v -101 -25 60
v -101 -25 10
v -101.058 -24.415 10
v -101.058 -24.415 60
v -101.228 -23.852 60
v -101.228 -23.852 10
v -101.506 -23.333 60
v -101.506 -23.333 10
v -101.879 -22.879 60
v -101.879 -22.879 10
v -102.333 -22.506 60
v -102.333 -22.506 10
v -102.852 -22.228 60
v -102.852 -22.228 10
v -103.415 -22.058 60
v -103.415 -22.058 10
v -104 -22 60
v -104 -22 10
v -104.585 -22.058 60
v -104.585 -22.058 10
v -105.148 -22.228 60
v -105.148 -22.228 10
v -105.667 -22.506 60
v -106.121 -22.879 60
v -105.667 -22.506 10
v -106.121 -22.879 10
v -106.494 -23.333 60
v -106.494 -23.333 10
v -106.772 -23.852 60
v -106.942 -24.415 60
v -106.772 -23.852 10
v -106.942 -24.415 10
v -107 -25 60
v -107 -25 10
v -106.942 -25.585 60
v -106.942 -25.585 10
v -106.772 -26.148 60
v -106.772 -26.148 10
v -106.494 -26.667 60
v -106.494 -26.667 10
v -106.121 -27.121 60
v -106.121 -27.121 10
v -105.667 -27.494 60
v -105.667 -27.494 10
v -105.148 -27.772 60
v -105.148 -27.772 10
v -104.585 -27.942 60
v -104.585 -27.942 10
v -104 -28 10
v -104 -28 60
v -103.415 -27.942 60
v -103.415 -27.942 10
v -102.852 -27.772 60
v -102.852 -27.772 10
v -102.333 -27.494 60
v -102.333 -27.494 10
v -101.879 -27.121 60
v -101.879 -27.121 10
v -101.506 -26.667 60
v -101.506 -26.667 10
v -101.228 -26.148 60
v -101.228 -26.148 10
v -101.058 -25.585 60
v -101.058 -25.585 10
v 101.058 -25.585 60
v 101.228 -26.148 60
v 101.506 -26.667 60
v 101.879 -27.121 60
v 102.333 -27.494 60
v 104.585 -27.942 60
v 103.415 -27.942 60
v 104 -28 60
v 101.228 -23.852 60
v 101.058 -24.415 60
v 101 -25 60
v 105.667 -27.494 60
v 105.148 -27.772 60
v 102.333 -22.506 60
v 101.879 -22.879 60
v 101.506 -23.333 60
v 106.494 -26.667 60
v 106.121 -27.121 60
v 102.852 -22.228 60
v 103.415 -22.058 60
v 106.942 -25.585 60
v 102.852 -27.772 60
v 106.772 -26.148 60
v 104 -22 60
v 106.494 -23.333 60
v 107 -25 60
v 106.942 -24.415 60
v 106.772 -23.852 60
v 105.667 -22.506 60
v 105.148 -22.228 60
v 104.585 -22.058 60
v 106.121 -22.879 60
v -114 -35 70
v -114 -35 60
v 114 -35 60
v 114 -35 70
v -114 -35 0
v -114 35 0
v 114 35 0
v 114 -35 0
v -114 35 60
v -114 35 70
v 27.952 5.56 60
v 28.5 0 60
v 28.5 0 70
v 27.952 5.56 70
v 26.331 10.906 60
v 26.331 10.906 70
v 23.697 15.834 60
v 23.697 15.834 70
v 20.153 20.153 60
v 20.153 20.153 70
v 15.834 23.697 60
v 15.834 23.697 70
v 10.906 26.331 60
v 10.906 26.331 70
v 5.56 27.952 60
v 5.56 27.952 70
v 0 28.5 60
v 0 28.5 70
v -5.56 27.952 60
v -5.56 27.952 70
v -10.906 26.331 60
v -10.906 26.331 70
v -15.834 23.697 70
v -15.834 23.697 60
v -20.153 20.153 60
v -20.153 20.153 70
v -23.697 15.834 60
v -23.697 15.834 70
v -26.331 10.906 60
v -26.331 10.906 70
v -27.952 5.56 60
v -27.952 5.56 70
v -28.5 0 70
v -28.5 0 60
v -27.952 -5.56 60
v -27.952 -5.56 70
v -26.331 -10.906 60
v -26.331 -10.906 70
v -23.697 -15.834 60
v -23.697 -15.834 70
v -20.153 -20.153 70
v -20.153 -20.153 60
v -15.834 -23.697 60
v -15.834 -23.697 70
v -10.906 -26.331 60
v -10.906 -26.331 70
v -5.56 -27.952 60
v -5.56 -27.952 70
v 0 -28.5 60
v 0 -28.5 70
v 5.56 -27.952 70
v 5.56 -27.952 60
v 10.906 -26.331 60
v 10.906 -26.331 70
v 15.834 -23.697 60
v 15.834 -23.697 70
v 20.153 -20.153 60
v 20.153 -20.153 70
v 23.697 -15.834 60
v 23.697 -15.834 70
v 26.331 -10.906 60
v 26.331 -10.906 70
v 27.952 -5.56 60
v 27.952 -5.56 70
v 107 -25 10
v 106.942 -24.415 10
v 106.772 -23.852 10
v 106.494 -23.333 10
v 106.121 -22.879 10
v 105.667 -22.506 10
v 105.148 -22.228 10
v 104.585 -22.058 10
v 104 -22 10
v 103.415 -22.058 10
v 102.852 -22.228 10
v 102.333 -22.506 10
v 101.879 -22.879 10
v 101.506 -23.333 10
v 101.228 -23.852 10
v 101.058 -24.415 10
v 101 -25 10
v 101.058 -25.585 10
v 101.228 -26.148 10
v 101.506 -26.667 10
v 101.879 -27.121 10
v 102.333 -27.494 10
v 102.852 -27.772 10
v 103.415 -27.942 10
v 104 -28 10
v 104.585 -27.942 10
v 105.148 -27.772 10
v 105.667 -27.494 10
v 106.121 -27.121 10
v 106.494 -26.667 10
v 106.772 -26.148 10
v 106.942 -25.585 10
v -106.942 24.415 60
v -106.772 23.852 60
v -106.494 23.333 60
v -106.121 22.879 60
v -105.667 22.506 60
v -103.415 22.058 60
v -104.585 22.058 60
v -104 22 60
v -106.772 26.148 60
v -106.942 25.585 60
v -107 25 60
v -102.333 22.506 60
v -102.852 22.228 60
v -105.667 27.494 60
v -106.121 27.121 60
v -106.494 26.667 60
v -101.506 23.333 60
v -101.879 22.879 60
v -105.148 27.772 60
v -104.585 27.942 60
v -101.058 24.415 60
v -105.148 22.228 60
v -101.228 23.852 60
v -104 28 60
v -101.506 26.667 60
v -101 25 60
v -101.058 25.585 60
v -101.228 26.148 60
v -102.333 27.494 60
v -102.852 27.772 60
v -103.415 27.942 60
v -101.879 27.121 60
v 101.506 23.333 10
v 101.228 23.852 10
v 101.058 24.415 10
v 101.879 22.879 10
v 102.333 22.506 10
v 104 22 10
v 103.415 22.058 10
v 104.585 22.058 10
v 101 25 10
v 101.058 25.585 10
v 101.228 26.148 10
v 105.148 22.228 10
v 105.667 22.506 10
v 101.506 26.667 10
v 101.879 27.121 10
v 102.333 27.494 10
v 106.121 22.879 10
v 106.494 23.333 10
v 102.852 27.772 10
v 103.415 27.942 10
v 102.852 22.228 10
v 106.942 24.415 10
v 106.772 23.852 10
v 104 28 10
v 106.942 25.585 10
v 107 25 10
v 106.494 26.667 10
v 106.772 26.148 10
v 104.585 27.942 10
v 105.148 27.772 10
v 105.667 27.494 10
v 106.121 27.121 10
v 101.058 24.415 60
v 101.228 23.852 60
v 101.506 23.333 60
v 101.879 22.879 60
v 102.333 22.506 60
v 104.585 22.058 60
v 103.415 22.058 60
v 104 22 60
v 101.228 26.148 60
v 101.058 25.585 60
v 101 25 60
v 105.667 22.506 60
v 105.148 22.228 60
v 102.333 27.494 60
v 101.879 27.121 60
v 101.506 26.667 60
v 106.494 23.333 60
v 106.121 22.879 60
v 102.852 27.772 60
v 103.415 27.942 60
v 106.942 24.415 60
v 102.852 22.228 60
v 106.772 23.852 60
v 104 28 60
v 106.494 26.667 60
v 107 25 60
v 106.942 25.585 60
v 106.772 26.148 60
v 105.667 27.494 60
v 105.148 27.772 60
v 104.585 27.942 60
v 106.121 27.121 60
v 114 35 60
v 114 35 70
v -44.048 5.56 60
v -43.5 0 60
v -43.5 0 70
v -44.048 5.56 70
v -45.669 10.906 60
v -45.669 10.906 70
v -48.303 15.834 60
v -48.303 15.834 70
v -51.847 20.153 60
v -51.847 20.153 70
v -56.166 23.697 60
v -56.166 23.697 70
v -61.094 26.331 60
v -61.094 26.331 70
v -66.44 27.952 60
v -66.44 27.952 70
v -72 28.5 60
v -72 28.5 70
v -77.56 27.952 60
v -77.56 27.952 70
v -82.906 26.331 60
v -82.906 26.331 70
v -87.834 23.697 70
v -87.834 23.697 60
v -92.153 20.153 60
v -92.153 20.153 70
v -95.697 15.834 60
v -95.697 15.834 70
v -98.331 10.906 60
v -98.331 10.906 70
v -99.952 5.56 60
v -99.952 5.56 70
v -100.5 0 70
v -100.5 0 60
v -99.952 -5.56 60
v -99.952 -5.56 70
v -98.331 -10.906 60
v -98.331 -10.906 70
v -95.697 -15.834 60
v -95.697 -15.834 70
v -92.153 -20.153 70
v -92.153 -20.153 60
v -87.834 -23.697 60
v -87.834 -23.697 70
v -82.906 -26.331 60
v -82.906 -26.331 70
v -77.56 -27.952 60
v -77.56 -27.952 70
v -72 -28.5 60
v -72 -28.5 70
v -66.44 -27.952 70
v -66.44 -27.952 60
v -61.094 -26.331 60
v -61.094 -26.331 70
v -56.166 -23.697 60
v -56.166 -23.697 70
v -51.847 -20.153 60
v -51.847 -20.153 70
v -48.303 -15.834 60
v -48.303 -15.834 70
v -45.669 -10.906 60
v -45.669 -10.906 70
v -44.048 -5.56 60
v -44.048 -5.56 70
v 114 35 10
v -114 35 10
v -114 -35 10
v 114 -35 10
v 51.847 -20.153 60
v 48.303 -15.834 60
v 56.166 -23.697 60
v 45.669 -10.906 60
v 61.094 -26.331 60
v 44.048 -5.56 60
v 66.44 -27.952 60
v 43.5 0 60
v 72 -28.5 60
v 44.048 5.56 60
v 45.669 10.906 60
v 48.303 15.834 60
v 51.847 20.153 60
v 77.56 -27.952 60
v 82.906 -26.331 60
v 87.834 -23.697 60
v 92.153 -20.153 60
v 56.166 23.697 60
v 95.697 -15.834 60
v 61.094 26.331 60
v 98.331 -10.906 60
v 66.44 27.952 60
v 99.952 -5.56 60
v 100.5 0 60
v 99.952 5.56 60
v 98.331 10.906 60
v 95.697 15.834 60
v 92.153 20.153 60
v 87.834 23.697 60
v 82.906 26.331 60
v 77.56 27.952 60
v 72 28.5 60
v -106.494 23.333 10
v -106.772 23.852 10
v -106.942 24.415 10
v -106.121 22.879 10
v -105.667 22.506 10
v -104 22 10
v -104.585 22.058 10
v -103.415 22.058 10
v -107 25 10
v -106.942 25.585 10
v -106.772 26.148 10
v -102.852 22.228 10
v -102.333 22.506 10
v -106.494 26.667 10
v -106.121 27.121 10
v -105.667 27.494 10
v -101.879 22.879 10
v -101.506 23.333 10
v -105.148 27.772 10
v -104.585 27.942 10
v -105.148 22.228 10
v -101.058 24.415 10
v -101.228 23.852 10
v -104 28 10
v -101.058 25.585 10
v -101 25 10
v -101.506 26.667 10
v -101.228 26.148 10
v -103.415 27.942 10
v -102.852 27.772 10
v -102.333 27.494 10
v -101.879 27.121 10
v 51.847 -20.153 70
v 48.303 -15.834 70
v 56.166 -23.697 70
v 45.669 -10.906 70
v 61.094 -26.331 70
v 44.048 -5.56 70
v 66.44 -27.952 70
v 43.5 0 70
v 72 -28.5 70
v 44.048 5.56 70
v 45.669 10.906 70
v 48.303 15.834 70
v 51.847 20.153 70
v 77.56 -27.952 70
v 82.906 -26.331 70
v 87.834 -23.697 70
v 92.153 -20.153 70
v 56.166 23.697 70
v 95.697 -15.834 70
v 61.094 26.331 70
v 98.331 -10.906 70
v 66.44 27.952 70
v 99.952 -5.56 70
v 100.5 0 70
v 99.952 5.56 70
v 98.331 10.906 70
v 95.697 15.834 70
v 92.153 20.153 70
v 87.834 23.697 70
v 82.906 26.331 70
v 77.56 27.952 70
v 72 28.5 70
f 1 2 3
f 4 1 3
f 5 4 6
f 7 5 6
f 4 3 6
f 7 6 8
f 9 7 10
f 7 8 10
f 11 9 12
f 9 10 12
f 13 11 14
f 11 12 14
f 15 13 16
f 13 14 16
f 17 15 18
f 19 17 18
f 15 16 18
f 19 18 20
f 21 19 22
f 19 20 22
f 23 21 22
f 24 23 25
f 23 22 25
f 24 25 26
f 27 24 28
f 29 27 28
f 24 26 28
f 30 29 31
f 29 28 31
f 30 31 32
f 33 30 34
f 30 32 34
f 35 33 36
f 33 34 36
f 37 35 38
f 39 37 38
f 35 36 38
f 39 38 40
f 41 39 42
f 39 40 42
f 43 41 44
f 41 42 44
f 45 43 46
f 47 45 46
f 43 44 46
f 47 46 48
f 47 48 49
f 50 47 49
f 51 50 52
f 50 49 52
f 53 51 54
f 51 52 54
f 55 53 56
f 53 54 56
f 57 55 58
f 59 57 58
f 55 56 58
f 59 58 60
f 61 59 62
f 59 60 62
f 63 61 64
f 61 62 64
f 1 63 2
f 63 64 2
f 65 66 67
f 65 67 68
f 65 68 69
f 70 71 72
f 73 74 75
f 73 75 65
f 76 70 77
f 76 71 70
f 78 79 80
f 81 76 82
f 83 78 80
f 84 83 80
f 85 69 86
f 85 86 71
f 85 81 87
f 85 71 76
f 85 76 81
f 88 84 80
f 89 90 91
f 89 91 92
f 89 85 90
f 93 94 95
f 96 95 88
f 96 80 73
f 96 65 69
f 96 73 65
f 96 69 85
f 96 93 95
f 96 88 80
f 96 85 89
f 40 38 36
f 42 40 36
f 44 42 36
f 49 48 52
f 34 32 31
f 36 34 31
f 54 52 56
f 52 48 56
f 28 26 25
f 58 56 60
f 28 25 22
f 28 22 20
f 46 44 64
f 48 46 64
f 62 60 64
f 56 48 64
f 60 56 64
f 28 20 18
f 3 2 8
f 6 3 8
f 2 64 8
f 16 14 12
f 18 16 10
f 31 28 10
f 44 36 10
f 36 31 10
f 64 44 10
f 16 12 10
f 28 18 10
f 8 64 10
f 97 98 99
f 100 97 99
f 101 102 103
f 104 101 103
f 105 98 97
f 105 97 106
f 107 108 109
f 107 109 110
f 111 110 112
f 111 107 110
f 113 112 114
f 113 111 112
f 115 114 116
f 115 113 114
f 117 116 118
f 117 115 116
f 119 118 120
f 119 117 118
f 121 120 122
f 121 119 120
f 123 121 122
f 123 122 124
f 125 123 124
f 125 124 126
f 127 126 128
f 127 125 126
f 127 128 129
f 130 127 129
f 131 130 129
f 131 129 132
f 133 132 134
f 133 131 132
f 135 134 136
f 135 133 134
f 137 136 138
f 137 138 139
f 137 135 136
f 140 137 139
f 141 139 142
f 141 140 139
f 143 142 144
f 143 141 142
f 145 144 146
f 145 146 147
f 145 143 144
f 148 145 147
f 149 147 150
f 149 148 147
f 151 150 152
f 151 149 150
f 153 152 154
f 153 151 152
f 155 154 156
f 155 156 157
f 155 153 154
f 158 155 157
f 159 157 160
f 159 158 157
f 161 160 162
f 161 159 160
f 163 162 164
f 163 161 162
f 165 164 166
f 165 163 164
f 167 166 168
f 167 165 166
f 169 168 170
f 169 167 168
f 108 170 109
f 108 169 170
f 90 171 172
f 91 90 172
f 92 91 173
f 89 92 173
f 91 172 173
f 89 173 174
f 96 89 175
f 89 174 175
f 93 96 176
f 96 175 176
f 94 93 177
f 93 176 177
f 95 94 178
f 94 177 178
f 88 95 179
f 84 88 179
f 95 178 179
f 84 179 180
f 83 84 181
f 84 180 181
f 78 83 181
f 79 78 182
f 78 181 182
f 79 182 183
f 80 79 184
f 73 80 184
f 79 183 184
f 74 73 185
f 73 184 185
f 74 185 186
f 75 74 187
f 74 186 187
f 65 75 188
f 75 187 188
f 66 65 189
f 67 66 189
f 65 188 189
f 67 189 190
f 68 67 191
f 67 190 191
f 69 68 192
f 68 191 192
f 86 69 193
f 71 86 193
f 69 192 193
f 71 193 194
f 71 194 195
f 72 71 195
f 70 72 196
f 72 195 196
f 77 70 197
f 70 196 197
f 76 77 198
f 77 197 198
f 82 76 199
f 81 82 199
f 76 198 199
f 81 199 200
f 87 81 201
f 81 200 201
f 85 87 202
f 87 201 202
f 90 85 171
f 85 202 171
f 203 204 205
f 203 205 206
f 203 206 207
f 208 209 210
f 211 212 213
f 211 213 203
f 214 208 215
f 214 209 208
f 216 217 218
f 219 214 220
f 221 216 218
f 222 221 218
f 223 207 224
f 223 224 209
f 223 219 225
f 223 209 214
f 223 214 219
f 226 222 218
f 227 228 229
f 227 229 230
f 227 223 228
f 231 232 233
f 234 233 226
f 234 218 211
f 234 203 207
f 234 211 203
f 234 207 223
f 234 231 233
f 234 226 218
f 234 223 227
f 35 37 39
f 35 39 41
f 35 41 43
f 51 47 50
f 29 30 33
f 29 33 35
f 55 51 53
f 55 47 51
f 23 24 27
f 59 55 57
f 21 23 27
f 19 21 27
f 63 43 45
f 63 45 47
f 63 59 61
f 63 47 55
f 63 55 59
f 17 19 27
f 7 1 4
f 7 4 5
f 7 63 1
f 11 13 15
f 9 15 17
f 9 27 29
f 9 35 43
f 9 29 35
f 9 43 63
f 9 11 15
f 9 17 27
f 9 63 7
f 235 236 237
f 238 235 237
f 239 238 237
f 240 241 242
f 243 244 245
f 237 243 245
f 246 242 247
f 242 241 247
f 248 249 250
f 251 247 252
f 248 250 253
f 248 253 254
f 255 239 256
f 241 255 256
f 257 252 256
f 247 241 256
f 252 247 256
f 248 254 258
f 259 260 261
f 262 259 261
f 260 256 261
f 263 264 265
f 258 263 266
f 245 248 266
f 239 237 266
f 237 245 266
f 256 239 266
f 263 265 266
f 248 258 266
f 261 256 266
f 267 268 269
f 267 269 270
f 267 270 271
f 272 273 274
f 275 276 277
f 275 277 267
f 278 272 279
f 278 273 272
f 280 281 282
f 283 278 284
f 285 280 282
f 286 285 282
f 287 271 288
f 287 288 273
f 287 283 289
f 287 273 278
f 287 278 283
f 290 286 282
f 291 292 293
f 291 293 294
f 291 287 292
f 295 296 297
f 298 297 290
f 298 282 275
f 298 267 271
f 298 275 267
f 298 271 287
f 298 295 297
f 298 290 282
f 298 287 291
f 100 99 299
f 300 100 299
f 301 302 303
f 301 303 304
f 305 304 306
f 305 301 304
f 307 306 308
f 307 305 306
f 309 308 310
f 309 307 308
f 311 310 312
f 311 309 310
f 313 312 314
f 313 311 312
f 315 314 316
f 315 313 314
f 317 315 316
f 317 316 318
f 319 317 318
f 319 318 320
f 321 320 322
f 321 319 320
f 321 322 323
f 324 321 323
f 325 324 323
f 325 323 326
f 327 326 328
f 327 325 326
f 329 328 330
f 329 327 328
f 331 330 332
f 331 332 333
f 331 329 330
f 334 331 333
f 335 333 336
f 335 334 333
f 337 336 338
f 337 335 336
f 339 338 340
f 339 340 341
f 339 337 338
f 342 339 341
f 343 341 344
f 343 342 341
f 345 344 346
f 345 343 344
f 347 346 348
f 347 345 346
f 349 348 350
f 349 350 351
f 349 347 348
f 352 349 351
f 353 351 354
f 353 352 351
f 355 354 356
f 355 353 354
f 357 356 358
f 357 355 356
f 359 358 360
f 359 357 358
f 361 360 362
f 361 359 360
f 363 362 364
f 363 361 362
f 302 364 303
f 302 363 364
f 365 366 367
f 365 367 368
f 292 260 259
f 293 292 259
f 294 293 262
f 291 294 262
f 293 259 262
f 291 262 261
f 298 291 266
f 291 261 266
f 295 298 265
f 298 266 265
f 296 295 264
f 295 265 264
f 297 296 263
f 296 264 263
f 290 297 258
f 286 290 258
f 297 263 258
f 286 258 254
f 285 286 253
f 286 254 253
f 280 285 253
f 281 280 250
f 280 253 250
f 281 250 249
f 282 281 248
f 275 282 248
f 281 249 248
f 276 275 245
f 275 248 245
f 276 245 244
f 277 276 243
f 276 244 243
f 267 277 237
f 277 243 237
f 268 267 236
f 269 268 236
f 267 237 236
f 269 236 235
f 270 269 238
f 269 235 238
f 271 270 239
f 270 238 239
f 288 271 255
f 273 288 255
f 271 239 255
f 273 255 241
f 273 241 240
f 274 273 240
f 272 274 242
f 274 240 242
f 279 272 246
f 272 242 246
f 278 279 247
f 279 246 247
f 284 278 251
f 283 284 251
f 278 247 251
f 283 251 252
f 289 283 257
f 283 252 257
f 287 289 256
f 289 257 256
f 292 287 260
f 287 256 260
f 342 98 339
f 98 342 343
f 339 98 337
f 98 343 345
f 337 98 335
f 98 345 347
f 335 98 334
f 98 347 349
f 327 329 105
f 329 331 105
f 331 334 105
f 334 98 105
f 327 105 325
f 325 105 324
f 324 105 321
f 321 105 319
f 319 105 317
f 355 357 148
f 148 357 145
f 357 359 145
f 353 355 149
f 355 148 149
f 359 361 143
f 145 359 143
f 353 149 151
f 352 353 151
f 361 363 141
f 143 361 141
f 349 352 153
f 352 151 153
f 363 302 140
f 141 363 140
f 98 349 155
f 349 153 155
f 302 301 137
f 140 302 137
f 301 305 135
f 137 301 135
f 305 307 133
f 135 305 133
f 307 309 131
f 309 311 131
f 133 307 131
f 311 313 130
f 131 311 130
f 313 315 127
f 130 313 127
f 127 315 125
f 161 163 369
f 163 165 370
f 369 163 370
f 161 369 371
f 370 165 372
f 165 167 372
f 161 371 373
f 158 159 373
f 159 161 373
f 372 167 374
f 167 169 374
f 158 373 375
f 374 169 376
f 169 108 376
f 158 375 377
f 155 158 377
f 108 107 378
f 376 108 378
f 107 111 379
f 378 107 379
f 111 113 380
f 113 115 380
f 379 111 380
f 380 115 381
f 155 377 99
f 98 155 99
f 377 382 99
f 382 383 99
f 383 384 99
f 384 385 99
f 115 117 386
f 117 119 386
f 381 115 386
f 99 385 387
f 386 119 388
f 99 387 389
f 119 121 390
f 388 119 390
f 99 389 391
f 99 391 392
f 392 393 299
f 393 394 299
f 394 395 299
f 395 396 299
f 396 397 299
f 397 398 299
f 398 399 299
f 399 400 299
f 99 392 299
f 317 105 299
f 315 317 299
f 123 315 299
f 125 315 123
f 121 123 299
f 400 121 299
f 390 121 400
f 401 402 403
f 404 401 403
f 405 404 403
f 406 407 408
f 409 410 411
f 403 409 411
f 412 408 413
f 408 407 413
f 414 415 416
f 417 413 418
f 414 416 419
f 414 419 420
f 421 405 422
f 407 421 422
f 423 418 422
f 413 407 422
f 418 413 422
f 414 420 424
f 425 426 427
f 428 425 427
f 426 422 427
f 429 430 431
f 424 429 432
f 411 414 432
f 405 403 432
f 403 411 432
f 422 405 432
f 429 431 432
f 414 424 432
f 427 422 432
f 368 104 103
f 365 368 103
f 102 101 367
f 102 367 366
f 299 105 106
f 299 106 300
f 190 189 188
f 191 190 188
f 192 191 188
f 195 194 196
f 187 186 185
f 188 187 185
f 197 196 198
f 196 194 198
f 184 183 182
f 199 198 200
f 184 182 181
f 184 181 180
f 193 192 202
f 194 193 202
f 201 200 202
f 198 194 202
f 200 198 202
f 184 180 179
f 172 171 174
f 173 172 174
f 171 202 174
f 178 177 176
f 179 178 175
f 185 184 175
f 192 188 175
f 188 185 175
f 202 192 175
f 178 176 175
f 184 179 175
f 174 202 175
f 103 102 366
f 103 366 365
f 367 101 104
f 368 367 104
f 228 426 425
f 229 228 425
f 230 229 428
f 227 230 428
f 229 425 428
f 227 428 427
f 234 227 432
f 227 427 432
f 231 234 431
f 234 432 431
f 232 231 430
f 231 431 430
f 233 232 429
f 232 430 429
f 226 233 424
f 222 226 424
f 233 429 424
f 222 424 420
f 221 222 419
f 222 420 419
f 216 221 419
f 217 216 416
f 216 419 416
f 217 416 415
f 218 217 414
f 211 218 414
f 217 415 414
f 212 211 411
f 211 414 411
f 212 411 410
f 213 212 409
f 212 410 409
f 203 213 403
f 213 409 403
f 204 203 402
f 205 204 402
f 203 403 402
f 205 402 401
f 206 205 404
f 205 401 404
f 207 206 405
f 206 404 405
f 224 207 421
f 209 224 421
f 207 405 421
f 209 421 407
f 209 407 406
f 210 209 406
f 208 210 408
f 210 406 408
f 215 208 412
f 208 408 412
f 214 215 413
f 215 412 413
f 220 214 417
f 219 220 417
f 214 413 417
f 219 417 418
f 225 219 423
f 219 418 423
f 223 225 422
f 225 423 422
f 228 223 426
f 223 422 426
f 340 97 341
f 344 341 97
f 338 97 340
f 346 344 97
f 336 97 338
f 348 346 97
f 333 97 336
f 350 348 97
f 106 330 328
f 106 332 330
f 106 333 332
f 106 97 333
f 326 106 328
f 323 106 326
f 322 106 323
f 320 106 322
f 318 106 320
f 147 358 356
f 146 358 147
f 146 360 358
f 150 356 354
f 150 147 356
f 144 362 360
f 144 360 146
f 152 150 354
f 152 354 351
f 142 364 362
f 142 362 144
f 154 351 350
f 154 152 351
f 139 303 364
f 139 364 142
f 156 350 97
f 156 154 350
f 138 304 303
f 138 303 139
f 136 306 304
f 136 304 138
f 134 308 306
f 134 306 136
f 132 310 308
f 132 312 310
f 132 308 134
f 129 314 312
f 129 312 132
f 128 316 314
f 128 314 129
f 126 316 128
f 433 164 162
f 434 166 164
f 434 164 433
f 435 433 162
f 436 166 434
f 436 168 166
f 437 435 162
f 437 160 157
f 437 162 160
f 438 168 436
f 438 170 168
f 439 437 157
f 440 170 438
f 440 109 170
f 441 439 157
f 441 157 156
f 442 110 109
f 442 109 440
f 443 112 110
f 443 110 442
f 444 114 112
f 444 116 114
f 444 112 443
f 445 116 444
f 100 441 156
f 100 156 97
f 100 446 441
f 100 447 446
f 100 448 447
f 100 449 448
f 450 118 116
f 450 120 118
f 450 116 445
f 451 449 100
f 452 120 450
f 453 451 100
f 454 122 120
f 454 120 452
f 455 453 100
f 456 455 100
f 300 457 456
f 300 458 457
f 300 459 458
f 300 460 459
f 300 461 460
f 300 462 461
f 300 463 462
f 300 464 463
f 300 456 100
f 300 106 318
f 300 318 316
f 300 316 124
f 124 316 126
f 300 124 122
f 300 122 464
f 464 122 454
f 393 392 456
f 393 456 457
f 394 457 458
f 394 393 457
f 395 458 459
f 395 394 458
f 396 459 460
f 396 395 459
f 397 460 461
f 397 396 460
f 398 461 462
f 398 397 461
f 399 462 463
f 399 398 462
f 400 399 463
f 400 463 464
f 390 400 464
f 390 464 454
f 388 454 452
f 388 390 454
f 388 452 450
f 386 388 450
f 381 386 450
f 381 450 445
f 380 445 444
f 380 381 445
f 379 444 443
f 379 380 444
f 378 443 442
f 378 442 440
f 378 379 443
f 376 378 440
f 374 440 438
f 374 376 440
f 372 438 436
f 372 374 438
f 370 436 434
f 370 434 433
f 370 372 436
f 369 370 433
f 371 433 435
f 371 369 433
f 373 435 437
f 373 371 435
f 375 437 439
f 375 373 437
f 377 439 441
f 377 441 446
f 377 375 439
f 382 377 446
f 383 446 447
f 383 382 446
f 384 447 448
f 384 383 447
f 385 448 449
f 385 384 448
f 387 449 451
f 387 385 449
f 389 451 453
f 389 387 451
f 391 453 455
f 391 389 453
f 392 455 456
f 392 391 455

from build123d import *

# Parameters (mm, degrees)
F0_W     = 228
F0_H     = 70
F1_DEPTH = 10
F3_W     = 228
F3_H     = 70
F3_R     = 28.5
F4_DEPTH = 10
F5_R     = 3
F6_DEPTH = 50


with BuildPart() as f1:
    # F0 (on Top) → F1 (new body)
    with BuildSketch(Plane.XY):
        Rectangle(F0_W, F0_H)
    extrude(amount=F1_DEPTH)


with BuildPart() as f4:
    # F3 (on offset) → F4 (new body)
    with BuildSketch(Plane.XY.offset(60)):
        Rectangle(F3_W, F3_H)
        with Locations((-72, 0)):
            Circle(F3_R, mode=Mode.SUBTRACT)
        Circle(F3_R, mode=Mode.SUBTRACT)
        with Locations((72, 0)):
            Circle(F3_R, mode=Mode.SUBTRACT)
    extrude(amount=F4_DEPTH)


with BuildPart() as f6:
    # F5 (on face) → F6 (new body, through all)
    with BuildSketch(Plane.XY.offset(10)):
        with Locations((-104, -25)):
            Circle(F5_R)
    extrude(amount=F6_DEPTH)


with BuildPart() as f6b:
    # F5 (on face) → F6, piece 2 (new body, through all)
    with BuildSketch(Plane.XY.offset(10)):
        with Locations((-104, 25)):
            Circle(F5_R)
    extrude(amount=F6_DEPTH)


with BuildPart() as f6c:
    # F5 (on face) → F6, piece 3 (new body, through all)
    with BuildSketch(Plane.XY.offset(10)):
        with Locations((104, 25)):
            Circle(F5_R)
    extrude(amount=F6_DEPTH)


with BuildPart() as f6d:
    # F5 (on face) → F6, piece 4 (new body, through all)
    with BuildSketch(Plane.XY.offset(10)):
        with Locations((104, -25)):
            Circle(F5_R)
    extrude(amount=F6_DEPTH)


solid = Compound([f1.part, f4.part, f6.part, f6b.part, f6c.part, f6d.part])
